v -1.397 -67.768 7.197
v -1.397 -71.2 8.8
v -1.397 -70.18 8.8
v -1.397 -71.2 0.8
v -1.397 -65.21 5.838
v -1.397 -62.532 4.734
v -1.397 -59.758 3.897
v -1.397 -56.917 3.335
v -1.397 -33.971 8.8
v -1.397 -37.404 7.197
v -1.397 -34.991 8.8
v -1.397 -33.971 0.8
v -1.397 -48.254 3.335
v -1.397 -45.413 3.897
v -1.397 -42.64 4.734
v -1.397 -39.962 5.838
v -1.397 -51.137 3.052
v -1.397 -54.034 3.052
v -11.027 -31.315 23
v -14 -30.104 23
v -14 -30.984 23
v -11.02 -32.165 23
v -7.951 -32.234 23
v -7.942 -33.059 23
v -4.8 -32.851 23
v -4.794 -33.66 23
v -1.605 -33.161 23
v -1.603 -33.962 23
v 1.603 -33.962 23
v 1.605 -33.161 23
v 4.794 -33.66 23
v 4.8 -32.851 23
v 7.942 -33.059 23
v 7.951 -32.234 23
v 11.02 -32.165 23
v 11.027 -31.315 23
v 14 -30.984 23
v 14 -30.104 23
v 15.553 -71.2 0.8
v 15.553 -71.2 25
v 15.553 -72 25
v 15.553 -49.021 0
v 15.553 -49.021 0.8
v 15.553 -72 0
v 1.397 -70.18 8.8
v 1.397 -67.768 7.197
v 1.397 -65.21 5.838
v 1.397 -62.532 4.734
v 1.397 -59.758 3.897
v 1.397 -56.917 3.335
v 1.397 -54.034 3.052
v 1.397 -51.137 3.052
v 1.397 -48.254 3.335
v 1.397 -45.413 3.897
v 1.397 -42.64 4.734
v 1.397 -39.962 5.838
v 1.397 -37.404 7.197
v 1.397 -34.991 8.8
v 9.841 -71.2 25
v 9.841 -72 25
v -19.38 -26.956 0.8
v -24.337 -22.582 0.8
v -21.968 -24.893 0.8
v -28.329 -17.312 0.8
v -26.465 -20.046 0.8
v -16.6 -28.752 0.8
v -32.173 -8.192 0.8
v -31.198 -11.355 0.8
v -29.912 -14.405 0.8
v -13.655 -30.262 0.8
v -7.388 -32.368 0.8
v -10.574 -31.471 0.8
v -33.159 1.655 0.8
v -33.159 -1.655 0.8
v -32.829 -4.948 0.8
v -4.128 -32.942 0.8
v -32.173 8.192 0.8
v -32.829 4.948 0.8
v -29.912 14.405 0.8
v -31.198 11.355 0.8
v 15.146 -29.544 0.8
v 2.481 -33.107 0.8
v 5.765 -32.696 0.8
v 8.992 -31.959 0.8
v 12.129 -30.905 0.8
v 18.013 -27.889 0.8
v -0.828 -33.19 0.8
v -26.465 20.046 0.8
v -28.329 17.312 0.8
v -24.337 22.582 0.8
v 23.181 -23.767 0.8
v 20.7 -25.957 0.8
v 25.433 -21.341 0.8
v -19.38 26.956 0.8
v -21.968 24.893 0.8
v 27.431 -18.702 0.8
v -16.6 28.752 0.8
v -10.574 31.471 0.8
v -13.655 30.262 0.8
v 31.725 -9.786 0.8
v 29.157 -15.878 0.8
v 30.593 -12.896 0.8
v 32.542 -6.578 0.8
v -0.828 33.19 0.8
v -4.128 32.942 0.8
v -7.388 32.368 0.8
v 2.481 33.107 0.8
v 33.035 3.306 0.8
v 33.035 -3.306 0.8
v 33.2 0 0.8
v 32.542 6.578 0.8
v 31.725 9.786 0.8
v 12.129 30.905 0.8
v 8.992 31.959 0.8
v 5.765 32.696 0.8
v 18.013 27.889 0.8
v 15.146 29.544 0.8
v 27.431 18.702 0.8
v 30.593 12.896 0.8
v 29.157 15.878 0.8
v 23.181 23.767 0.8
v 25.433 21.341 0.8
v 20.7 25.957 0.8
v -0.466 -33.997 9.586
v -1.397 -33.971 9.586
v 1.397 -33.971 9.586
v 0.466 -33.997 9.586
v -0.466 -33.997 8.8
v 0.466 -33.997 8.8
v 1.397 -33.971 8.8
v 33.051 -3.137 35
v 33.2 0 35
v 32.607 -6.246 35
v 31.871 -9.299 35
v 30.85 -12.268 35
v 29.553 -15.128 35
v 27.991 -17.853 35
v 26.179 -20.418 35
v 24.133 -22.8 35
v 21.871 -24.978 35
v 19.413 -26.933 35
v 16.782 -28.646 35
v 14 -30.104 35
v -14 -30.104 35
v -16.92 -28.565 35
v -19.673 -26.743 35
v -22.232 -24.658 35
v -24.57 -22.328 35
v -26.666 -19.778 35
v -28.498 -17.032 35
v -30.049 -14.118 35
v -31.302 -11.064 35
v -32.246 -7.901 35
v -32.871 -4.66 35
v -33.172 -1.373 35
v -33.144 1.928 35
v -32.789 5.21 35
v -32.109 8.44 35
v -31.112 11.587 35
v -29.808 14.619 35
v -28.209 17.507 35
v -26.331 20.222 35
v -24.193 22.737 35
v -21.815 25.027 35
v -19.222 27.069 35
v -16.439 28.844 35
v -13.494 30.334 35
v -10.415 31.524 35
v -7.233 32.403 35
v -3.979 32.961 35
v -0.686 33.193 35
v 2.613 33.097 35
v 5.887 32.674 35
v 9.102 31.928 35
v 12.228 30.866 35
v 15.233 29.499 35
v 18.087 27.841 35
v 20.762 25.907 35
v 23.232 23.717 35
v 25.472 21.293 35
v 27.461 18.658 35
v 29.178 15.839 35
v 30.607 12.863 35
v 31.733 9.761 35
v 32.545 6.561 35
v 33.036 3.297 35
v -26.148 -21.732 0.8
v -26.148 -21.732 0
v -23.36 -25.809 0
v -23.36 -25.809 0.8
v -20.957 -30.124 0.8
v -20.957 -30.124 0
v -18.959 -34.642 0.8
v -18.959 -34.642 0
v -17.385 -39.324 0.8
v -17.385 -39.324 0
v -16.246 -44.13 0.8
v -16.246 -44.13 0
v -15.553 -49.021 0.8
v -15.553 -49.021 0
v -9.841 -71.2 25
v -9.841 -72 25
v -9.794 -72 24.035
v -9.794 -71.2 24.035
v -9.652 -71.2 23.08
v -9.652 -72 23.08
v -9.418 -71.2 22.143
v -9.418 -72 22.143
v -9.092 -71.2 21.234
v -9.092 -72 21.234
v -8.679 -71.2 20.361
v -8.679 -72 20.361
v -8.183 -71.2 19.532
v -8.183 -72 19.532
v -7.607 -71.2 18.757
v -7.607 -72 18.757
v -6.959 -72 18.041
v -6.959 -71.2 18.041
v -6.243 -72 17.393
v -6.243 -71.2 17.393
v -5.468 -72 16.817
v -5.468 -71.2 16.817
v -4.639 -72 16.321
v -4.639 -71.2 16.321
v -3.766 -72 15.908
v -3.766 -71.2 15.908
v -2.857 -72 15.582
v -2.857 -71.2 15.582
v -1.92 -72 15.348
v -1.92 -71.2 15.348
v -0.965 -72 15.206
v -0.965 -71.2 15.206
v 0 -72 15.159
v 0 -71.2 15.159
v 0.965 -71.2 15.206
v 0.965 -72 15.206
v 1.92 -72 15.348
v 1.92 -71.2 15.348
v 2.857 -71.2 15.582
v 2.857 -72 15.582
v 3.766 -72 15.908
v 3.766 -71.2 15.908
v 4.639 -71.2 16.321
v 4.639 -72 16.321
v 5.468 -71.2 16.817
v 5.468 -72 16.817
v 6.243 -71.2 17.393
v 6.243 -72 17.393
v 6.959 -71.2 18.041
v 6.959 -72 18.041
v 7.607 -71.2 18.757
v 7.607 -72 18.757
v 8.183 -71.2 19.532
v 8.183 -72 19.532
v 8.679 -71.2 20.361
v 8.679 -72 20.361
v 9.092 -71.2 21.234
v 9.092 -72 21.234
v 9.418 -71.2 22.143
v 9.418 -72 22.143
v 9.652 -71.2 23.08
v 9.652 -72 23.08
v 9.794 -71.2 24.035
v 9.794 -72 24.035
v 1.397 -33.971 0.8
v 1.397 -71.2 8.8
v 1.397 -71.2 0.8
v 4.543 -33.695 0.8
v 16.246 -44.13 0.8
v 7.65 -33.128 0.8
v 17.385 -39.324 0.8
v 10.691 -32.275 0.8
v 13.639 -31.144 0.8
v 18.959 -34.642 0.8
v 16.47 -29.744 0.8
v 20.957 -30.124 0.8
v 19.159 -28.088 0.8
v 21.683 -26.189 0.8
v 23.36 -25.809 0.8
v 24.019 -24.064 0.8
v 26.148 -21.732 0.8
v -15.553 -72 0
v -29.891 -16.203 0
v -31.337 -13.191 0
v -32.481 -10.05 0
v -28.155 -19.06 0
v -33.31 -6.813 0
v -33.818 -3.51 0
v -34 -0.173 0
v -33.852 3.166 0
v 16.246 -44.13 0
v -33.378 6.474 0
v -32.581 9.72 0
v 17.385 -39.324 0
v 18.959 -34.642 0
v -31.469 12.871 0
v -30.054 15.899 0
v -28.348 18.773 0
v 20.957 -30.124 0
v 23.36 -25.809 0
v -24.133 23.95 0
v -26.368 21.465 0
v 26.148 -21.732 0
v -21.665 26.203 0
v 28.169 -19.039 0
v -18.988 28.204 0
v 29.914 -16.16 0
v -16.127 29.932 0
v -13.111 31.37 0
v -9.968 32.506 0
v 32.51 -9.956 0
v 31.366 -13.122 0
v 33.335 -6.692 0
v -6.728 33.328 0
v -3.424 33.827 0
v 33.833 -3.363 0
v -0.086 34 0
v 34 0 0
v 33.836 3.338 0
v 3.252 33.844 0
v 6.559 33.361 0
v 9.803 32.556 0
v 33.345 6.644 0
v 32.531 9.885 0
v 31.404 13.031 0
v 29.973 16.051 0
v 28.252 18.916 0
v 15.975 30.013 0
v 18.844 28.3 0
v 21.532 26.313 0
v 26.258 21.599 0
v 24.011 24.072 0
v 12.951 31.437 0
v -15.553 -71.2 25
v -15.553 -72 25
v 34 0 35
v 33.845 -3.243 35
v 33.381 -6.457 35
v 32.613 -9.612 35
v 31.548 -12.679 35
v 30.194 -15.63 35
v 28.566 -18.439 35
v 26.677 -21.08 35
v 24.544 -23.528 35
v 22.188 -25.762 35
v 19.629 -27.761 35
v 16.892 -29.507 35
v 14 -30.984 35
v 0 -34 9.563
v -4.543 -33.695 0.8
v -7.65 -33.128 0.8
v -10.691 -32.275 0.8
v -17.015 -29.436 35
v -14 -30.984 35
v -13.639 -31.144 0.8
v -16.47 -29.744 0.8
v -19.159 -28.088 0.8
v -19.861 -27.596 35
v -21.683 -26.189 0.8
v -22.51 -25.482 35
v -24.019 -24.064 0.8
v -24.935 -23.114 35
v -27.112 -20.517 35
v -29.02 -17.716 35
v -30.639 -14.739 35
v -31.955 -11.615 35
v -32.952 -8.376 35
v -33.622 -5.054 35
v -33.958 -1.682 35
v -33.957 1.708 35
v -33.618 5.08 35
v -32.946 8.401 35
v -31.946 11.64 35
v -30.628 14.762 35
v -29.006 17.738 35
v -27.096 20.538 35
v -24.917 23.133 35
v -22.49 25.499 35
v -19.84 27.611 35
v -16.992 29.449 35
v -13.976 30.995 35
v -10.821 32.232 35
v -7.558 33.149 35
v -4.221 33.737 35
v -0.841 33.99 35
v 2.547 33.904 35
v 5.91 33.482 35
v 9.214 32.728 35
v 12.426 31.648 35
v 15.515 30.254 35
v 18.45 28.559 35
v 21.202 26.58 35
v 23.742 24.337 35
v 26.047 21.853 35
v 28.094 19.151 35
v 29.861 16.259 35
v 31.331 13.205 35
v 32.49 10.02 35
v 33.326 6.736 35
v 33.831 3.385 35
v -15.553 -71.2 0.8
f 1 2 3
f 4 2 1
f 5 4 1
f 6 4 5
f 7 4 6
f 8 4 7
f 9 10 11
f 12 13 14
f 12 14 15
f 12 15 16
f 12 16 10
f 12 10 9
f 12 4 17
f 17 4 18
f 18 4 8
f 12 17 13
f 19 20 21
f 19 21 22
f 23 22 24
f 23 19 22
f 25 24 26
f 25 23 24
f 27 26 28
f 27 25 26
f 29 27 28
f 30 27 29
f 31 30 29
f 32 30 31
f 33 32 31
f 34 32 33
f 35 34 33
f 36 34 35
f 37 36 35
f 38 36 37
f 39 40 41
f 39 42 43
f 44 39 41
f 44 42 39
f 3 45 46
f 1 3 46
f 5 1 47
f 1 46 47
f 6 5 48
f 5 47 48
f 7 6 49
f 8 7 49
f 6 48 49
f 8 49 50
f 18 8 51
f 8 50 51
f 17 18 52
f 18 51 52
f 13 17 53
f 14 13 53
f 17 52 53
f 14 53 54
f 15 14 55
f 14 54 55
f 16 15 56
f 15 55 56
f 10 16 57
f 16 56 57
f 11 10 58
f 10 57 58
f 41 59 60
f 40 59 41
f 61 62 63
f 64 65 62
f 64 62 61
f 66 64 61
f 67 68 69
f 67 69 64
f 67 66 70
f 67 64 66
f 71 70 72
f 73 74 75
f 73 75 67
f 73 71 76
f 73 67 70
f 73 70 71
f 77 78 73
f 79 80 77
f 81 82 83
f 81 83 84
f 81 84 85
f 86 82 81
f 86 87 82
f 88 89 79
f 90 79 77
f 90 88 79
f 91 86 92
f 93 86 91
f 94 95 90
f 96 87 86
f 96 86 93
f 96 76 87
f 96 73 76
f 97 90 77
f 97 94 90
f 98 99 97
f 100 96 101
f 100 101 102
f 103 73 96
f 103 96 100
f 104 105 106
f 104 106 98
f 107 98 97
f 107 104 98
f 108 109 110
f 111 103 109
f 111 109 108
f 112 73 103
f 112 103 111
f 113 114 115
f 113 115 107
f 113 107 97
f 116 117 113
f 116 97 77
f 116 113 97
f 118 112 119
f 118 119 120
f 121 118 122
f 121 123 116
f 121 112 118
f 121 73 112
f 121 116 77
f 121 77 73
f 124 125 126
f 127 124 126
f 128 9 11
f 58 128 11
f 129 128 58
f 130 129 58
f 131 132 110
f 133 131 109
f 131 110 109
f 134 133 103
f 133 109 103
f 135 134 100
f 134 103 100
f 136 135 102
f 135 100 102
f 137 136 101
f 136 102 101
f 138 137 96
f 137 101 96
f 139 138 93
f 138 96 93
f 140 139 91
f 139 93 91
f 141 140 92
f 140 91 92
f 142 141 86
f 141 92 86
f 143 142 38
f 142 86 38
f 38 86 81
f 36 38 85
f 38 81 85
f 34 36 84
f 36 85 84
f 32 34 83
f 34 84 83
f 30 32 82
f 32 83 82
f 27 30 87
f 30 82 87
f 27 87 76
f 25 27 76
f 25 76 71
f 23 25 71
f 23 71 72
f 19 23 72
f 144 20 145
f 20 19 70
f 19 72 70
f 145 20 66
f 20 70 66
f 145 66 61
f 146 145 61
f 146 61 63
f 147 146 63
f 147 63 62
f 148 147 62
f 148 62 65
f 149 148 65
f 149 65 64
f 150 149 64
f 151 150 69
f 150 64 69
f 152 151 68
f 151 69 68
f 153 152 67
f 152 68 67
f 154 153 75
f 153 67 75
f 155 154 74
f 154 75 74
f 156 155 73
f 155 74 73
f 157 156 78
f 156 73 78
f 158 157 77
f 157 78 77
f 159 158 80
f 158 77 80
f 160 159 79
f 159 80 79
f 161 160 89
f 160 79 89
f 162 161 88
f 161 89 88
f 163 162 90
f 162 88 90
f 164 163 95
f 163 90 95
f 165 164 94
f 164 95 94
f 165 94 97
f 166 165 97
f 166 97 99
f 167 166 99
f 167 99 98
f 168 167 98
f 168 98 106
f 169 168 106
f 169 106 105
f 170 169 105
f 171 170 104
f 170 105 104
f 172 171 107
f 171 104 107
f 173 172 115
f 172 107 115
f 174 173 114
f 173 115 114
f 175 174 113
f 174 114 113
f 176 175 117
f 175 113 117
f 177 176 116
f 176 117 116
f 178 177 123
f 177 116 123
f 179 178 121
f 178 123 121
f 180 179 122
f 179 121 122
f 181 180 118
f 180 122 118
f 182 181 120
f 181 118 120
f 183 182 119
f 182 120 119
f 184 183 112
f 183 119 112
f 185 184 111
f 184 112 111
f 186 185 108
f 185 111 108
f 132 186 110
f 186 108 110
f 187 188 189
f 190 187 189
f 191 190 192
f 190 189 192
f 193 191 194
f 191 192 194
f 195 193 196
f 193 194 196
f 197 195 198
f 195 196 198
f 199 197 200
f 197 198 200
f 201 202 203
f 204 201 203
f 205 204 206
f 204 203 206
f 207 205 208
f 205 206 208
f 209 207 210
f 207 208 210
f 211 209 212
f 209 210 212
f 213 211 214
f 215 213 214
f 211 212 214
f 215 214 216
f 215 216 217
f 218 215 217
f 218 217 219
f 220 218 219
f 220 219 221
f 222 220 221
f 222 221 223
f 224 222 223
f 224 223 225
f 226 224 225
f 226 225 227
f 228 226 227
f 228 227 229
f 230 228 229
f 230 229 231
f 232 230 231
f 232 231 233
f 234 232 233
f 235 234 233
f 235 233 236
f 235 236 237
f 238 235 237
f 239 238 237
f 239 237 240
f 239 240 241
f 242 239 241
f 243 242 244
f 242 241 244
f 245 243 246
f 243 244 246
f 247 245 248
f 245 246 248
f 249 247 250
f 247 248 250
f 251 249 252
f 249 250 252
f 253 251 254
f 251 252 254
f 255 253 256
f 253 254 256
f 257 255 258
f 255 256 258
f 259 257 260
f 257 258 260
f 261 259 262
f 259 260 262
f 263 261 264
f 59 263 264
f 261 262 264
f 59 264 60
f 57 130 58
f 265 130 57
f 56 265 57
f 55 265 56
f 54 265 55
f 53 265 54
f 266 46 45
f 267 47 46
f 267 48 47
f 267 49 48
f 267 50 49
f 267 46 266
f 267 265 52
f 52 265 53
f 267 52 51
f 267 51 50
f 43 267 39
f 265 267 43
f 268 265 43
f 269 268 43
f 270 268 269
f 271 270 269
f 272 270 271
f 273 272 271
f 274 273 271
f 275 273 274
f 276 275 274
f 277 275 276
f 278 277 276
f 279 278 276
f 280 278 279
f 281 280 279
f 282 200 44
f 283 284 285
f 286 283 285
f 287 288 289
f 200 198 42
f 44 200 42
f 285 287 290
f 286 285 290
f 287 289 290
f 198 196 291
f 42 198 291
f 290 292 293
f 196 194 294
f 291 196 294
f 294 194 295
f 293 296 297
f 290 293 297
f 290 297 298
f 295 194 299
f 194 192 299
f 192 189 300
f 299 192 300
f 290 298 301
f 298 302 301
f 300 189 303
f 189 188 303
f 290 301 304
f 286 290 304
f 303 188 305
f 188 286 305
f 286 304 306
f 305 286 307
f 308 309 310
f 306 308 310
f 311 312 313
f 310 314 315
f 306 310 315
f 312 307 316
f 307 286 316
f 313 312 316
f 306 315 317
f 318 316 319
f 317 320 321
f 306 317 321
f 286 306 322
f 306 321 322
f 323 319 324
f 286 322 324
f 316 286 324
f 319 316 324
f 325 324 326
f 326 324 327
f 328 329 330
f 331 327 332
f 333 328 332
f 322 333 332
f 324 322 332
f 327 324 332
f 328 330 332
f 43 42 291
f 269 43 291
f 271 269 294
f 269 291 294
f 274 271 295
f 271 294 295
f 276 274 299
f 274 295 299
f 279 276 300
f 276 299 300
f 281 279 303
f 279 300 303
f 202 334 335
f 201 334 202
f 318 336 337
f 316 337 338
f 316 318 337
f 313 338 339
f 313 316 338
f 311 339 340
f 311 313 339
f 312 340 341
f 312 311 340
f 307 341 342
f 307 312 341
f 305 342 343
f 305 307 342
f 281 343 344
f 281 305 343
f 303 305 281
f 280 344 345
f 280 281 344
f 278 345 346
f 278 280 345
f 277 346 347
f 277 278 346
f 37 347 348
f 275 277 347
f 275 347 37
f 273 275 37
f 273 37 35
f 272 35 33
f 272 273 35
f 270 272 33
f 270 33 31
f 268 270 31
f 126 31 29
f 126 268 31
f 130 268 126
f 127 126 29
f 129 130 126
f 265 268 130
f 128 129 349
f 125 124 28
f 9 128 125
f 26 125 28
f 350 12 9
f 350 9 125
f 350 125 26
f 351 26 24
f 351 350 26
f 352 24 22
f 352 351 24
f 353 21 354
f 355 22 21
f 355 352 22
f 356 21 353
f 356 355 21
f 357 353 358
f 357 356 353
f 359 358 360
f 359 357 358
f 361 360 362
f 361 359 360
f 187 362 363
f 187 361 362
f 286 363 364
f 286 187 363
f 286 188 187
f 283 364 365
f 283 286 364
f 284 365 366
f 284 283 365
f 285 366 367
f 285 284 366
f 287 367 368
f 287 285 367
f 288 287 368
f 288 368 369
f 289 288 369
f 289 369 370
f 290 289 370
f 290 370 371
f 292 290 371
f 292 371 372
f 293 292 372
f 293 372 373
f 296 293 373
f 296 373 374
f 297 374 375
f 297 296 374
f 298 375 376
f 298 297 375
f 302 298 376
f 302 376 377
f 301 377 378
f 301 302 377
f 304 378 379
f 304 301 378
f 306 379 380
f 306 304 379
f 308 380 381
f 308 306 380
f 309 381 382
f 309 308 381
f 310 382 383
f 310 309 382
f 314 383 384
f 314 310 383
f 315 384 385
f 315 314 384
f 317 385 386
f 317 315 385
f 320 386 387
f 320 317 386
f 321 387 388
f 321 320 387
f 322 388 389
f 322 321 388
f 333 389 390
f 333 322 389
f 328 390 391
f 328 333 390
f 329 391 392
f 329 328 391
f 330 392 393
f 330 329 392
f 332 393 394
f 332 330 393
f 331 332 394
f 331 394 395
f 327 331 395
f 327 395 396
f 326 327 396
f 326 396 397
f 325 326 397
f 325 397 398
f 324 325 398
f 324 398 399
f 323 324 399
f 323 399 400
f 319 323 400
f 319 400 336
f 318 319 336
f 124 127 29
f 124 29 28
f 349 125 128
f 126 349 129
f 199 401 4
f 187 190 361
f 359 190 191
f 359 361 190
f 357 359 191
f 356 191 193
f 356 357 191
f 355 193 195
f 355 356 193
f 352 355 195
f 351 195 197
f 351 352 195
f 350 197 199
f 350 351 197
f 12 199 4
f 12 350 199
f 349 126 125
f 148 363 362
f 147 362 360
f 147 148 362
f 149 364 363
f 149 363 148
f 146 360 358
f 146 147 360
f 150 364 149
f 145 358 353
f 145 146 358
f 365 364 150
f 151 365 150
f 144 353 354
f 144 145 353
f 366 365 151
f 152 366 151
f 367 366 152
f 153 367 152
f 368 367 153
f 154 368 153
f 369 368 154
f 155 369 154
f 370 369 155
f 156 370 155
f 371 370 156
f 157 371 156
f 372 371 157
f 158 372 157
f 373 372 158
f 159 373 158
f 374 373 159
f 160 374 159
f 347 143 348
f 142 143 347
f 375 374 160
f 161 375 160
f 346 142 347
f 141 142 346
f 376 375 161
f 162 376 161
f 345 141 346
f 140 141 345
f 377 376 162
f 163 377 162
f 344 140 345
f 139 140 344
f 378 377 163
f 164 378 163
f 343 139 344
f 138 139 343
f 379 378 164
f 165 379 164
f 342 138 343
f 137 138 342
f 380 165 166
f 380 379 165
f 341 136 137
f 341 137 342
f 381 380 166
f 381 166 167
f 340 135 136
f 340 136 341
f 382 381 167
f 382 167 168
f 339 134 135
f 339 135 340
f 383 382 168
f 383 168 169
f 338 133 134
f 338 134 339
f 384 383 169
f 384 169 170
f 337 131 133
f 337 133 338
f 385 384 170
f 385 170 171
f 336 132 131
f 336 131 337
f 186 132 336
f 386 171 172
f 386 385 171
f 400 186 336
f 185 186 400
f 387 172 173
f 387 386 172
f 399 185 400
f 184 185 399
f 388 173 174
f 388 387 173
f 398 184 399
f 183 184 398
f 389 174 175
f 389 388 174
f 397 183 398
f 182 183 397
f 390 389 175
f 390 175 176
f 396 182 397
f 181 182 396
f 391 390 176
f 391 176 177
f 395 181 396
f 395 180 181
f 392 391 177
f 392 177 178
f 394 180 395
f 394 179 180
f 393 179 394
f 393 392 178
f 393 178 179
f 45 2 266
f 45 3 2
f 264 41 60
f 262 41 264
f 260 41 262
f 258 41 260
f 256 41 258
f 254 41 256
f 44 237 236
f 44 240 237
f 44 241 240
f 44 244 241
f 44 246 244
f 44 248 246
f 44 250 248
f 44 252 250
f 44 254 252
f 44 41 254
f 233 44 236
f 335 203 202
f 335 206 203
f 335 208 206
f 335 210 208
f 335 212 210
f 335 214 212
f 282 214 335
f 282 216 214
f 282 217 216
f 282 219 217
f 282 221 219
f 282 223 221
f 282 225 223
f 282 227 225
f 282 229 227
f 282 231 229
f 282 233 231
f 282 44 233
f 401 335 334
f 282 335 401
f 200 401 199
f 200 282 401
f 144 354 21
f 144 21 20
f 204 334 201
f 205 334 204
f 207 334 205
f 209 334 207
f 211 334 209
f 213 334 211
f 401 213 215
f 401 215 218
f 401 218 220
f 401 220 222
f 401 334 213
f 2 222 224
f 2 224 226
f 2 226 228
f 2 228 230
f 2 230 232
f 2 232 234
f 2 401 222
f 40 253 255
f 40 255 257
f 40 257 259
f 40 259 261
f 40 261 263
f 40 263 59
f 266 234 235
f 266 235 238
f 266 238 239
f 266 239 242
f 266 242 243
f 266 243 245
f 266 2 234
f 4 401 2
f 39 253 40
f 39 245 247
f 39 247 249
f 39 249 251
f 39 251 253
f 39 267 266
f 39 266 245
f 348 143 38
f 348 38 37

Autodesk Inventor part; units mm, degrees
ref_plane "YZ Plane" through (0, 0, 0) normal (1, 0, 0) x (0, 1, 0)
ref_plane "XZ Plane" through (0, 0, 0) normal (0, 1, 0) x (-1, 0, 0)
ref_plane "XY Plane" through (0, 0, 0) normal (0, 0, 1) x (1, 0, 0)
sketch "Sketch1" plane through (0, 0, 0) normal (0, 0, 1) x (1, 0, 0)
  circle A0 centre (0, 0) radius 34
  line L0 (15.5526, -72) -> (-15.5526, -72)
  line L1 (-15.5526, -72) -> (-15.5526, -49.0211)
  line L2 (-15.5526, -26.0423) -> (15.5526, -72) construction
  line L3 (15.5526, -26.0423) -> (-15.5526, -72) construction
  line L4 (-10.1666, -34) -> (10.1666, -34)
  arc A1 (-15.5526, -49.0211) -> (-26.1483, -21.7317) centre (-69.1292, -54.1216) ccw
  arc A2 (26.1483, -21.7317) -> (15.5526, -49.0211) centre (69.1292, -54.1216) ccw
  line L5 (15.5526, -49.0211) -> (15.5526, -72)
  circle A3 centre (0, 0) radius 33.2
  line L6 (-15.5526, -71.2) -> (15.5526, -71.2)
  point P0 (0, -49.0211)
  point P1 (26.1483, -21.7317)
  dimension "d0" = 68
  dimension "d1" = 38
  dimension "d2" = 0.8
  dimension "d3" = 0.8
extrude "Extrusion1" add sketch "Sketch1" along normal blind 0.8 contours A0 A2 L5 L6 L1 A1 | A3
extrude "Extrusion2" add sketch "Sketch1" along normal blind 25 contours L6 L5 L0 L1
extrude "Extrusion3" add sketch "Sketch1" along normal blind 35 contours A0
sketch "Sketch2" plane through (-15.5526, -72, 0) normal (0, -1, 0) x (1, 0, 0)
  line L0 (31.1053, 25) -> (0, 25) projected
  arc A0 (5.7113, 25) -> (25.3939, 25) centre (15.5526, 25) ccw
  line L1 (5.7113, 25) -> (25.3939, 25)
  point P0 (15.5526, 0)
extrude "Extrusion4" cut sketch "Sketch2" against normal blind 2
sketch "Sketch3" plane through (0, 0, 0.8) normal (0, 0, 1) x (1, 0, 0)
  line L0 (-9.8413, -71.2) -> (9.8413, -71.2) projected
  line L1 (-1.3972, -33.6906) -> (1.3972, -33.6906)
  line L2 (1.3972, -33.6906) -> (1.3972, -71.2)
  line L3 (1.3972, -71.2) -> (-1.3972, -71.2)
  line L4 (-1.3972, -71.2) -> (-1.3972, -33.6906)
  line L5 (-1.3972, -33.6906) -> (1.3972, -71.2) construction
  line L6 (1.3972, -33.6906) -> (-1.3972, -71.2) construction
  point P0 (0, 0)
  point P1 (0, -52.4453)
extrude "Extrusion5" add sketch "Sketch3" along normal blind 8
sketch "Sketch4" plane through (1.3972, -71.2, 0.8) normal (1, 0, 0) x (0, 0, -1)
  point P0 (0.8, 71.2)
sketch "Sketch5" plane through (1.3972, -71.2, 0.8) normal (1, 0, 0) x (0, 0, -1)
  line L0 (-12.1, 0) -> (-14.4584, 0)
  arc A0 (-8.7861, 0) -> (-8.7861, 37.2287) centre (-31.8736, 18.6144) ccw
  line L1 (-8.7861, 37.374) -> (-8.7861, 37.374)
  line L2 (-8, 37.2287) -> (0, 37.2287) projected
  line L3 (-8.7861, 37.374) -> (-8.7861, 0)
  point P0 (0.8, 71.2)
  point P1 (-25, 0)
  point P2 (-24.2, 37.2287)
extrude "Extrusion6" cut sketch "Sketch5" against normal up to surface (2.7945 mm away)
sketch "Sketch7" plane through (0, 0, 35) normal (0, 0, 1) x (1, 0, 0)
  line L0 (-14, -28.6906) -> (14, -28.6906)
  line L1 (14, -28.6906) -> (14, -38.6906)
  line L2 (14, -38.6906) -> (-14, -38.6906)
  line L3 (-14, -38.6906) -> (-14, -28.6906)
  line L4 (-1.3972, -33.6906) -> (1.3972, -33.6906) projected
  line L5 (-14, -28.6906) -> (14, -38.6906) construction
  line L6 (14, -28.6906) -> (-14, -38.6906) construction
  point P0 (0, 0)
  point P1 (0, -33.6906)
  dimension "d23" = 28
  dimension "d24" = 10
extrude "Extrusion8" cut sketch "Sketch7" against normal blind 12
properties part number "my_portafilter_holder"
